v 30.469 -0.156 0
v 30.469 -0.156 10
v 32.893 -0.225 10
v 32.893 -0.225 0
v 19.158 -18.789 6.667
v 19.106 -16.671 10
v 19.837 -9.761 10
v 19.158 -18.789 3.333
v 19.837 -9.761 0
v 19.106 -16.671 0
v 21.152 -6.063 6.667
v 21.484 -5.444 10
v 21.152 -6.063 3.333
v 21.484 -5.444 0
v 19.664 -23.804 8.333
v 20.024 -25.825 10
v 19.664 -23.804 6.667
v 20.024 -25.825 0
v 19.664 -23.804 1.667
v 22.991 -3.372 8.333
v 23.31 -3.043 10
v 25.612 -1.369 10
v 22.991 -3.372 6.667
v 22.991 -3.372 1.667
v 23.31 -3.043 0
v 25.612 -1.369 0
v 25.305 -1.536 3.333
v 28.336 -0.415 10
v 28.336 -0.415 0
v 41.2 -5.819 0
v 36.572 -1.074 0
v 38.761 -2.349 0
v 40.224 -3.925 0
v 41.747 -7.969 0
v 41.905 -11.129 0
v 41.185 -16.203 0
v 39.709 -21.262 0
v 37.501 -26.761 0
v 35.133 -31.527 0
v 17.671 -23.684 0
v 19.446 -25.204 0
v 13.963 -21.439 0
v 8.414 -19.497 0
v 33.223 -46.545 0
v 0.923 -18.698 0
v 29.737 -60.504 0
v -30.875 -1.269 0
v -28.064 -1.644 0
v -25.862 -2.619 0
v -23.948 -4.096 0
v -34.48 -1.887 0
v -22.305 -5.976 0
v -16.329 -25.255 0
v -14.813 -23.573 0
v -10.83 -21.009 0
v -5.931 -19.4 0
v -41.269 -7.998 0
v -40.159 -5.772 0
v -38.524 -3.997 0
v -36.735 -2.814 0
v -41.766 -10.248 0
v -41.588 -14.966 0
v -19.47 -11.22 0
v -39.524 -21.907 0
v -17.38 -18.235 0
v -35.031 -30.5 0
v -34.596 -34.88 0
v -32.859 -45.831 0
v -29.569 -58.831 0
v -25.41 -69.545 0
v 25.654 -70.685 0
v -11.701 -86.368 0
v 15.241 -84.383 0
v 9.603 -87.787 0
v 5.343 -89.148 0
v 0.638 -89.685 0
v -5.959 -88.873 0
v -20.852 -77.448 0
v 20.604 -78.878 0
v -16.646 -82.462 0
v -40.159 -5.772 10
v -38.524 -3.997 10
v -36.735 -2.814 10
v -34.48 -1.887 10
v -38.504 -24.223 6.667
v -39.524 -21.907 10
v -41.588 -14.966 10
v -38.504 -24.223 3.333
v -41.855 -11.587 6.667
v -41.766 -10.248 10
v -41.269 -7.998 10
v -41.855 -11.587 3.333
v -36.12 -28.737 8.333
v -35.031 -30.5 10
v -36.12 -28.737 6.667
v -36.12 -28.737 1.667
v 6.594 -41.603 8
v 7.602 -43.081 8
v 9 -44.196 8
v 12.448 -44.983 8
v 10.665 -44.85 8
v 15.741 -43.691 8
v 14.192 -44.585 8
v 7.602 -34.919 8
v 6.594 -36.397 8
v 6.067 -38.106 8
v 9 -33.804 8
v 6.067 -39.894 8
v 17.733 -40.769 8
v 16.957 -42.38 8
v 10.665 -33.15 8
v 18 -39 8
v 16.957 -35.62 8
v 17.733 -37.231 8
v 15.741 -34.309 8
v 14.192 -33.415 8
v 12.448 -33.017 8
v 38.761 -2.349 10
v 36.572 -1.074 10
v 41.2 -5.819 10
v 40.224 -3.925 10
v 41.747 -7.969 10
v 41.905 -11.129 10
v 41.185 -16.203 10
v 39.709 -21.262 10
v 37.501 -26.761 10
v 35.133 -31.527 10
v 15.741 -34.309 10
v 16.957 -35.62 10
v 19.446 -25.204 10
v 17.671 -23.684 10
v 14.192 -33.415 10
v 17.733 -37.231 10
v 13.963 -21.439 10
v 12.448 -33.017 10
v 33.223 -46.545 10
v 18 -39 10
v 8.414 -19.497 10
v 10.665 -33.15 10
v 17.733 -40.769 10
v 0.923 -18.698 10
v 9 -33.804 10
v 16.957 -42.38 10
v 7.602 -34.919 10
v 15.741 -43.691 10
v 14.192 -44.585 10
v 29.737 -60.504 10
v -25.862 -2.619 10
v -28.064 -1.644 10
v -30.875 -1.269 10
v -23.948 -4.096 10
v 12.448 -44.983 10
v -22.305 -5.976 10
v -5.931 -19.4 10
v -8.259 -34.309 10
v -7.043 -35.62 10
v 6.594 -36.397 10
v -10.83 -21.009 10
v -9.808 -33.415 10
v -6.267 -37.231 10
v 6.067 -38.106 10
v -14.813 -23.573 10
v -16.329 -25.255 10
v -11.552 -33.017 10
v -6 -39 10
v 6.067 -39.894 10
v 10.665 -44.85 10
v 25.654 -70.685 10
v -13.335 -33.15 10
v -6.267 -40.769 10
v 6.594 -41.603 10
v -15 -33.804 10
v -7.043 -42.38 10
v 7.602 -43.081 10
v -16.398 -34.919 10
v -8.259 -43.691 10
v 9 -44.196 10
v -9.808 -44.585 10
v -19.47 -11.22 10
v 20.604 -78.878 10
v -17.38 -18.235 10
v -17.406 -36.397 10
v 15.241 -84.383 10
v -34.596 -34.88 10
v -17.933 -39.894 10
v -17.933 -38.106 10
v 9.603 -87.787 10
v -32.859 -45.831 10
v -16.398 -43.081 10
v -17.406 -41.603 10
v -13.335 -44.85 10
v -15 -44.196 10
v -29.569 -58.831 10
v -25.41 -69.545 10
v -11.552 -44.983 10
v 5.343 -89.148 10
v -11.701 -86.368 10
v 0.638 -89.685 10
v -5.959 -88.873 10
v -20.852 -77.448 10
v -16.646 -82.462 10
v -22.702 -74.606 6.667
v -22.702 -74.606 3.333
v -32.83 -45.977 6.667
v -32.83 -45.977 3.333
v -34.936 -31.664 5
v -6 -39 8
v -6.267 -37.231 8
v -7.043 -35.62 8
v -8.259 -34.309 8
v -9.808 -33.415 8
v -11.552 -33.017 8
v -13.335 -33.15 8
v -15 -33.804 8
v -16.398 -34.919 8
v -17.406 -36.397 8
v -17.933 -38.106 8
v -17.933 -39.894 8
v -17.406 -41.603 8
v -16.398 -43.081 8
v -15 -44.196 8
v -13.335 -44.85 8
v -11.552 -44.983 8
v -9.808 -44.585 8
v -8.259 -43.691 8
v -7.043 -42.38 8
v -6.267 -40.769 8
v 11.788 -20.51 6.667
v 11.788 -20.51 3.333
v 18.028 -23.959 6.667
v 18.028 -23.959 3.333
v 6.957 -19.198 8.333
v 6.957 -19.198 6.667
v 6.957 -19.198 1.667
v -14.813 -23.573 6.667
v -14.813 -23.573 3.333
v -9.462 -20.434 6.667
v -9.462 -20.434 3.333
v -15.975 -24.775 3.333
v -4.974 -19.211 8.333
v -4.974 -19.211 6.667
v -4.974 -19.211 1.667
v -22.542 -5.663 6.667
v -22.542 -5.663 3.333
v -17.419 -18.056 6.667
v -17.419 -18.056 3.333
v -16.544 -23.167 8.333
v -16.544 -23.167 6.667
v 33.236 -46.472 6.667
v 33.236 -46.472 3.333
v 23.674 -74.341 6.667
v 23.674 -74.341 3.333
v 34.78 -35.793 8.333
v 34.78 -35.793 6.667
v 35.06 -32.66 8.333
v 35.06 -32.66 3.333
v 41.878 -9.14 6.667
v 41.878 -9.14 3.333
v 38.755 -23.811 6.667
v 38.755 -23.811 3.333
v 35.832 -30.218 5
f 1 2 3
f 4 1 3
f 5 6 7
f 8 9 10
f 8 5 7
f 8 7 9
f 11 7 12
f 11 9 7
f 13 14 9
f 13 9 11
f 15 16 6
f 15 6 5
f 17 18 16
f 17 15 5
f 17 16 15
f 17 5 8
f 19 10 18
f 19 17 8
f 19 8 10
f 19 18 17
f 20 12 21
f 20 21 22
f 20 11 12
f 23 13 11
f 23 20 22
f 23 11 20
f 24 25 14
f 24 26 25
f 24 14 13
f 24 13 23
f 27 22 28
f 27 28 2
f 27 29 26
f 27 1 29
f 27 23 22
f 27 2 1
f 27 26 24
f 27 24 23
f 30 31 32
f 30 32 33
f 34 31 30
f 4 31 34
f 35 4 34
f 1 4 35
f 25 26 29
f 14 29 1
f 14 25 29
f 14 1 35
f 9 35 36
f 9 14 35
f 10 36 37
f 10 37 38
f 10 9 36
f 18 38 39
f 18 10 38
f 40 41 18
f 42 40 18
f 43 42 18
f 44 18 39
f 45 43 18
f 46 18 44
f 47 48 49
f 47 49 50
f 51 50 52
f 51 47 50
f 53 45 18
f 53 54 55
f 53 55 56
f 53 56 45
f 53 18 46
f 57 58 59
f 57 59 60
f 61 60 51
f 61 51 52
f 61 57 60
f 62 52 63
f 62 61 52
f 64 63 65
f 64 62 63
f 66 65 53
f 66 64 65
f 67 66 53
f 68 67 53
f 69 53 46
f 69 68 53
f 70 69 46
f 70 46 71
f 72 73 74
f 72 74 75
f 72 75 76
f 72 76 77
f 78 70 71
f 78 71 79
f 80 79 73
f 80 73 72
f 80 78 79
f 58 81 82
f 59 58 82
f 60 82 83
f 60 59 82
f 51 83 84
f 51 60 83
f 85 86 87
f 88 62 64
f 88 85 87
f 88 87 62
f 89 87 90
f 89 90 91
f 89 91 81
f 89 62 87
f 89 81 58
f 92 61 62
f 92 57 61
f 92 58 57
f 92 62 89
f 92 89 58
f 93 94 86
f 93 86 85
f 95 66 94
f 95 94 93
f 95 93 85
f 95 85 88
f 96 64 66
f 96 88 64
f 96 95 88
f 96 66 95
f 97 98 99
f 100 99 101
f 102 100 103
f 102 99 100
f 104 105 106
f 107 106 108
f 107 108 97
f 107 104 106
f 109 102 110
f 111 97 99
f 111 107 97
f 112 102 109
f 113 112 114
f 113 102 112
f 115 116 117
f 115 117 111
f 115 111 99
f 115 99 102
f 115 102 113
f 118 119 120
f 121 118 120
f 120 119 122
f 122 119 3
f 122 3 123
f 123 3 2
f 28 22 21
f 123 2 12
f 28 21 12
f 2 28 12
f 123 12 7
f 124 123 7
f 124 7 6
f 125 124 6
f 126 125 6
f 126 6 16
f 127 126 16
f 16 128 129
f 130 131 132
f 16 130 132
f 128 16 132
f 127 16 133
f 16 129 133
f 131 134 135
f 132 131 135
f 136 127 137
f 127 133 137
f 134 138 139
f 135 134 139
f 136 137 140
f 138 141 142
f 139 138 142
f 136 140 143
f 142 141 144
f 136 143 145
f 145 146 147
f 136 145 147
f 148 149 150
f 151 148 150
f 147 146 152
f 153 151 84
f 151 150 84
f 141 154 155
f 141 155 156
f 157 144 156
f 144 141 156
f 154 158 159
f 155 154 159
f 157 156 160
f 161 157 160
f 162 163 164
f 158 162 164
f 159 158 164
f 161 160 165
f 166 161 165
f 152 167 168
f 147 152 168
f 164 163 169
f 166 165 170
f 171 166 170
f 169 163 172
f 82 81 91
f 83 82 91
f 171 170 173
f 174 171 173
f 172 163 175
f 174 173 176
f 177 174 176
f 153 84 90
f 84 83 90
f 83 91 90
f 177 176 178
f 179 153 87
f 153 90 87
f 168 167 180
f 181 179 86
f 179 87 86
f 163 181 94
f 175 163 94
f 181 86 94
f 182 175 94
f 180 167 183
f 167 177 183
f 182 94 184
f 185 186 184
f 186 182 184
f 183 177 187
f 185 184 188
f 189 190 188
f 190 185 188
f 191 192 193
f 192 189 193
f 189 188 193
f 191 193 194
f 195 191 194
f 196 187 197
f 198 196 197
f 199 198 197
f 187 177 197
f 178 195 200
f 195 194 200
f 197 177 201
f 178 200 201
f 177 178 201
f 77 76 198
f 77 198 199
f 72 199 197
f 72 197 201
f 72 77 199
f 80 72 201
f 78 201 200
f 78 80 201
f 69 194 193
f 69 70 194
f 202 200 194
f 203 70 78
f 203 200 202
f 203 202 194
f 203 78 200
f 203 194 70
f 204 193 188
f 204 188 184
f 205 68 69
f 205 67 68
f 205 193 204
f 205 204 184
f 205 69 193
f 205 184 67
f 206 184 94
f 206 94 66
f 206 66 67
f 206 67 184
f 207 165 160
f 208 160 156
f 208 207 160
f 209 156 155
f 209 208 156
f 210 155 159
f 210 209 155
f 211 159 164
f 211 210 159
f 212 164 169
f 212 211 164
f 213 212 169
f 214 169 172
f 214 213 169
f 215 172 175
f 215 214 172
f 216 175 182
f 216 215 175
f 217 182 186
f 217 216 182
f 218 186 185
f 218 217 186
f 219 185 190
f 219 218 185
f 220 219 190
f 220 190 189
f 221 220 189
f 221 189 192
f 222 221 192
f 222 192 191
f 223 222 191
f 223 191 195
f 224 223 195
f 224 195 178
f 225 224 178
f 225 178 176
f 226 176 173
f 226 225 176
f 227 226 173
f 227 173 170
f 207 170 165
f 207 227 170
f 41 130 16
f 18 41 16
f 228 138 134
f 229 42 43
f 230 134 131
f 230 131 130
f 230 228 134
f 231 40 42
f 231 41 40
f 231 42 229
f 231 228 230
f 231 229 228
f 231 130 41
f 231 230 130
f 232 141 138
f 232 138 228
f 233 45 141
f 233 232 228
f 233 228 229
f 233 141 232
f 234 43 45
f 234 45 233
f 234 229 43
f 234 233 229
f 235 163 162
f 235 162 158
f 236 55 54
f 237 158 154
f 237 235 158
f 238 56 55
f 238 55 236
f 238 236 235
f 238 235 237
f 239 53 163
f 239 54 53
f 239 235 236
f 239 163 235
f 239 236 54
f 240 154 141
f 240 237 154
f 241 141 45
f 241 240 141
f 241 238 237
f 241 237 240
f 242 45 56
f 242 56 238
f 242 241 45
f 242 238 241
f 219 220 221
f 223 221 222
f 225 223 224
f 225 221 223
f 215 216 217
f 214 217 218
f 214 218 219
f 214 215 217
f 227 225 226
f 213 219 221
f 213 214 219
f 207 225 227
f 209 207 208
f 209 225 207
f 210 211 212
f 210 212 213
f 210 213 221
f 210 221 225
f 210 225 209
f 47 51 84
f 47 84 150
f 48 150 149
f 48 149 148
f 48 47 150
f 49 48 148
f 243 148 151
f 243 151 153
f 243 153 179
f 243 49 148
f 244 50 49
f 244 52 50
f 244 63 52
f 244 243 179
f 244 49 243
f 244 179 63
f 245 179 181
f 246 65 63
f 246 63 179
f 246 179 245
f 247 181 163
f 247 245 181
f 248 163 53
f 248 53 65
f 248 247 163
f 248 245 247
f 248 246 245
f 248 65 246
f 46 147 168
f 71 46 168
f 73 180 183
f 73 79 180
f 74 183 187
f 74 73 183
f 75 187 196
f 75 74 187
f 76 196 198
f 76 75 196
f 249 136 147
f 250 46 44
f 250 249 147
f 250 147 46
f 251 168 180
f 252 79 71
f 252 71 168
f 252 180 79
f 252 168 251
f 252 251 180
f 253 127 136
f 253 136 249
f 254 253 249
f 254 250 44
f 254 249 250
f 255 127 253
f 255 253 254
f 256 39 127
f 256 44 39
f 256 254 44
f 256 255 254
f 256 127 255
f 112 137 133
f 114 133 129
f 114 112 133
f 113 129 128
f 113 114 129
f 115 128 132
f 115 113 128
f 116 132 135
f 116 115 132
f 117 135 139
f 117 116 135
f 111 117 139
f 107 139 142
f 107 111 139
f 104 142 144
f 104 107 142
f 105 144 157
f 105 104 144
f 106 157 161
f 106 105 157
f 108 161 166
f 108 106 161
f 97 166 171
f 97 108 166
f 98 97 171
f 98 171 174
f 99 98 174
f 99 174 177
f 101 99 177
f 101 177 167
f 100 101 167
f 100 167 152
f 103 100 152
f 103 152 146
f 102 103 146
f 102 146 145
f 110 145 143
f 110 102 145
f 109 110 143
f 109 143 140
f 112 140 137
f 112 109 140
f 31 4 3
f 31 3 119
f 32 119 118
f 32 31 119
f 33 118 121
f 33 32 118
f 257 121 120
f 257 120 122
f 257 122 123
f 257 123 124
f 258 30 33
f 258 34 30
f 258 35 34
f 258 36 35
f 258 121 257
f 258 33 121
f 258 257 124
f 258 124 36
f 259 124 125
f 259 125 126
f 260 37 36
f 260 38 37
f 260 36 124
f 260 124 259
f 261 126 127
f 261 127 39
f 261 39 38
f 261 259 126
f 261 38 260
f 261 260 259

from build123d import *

# Parameters (mm, degrees)
CYLINDER001_R     = 6
CYLINDER001_DEPTH = 10
CYLINDER_R        = 6
CYLINDER_DEPTH    = 10
EXTRUDE_DEPTH     = 10


with BuildPart() as cilindro001:
    # Cylinder001 → Cylinder001 (new body)
    with BuildSketch(Plane(origin=(54, -39, 8), x_dir=(1, 0, 0), z_dir=(0, 0, 1))):
        Circle(CYLINDER001_R)
    extrude(amount=CYLINDER001_DEPTH)


with BuildPart() as fusion:
    # Cylinder → Cylinder (new body)
    with BuildSketch(Plane(origin=(30, -39, 8), x_dir=(1, 0, 0), z_dir=(0, 0, 1))):
        Circle(CYLINDER_R)
    extrude(amount=CYLINDER_DEPTH)

    # Fusion: union Cilindro001
    add(cilindro001.part)


with BuildPart() as cut:
    # path4136 → Extrude (new body)
    with BuildSketch(Plane(origin=(42.376579, -44.354878, 0), x_dir=(0, -1, 0), z_dir=(0, 0, -1))):
        with BuildLine():
            add(Edge.make_bspline(
                [(-13.85455, 35.407203), (-13.85455, 35.407203), (-37.333463, 51.129846), (-42.46778, 34.856929)],
                knots=[0, 0, 0, 0, 1, 1, 1, 1], degree=3))
            add(Edge.make_bspline(
                [(-42.46778, 34.856929), (-47.602099, 18.584013), (-19.100017, 16.70568), (-19.100017, 16.70568)],
                knots=[0, 0, 0, 0, 1, 1, 1, 1], degree=3))
            add(Edge.make_bspline(
                [(-19.100017, 16.70568), (-19.100017, 16.70568), (-25.576689, 12.757134), (-25.65703, -0.546311)],
                knots=[0, 0, 0, 0, 1, 1, 1, 1], degree=3))
            add(Edge.make_bspline(
                [(-25.65703, -0.546311), (-25.73737, -13.849756), (-18.52984, -19.647173), (-18.52984, -19.647173)],
                knots=[0, 0, 0, 0, 1, 1, 1, 1], degree=3))
            add(Edge.make_bspline(
                [(-18.52984, -19.647173), (-18.52984, -19.647173), (-45.927429, -13.606641), (-44.129391, -32.51663)],
                knots=[0, 0, 0, 0, 1, 1, 1, 1], degree=3))
            add(Edge.make_bspline(
                [(-44.129391, -32.51663), (-42.331353, -51.426623), (-12.828091, -34.756809), (-12.828091, -34.756809)],
                knots=[0, 0, 0, 0, 1, 1, 1, 1], degree=3))
            add(Edge.make_bspline(
                [(-12.828091, -34.756809), (-12.828091, -34.756809), (44.732088, -31.969997), (45.329759, -0.261224)],
                knots=[0, 0, 0, 0, 1, 1, 1, 1], degree=3))
            add(Edge.make_bspline(
                [(45.329759, -0.261224), (45.927429, 31.447549), (-13.85455, 35.407203), (-13.85455, 35.407203)],
                knots=[0, 0, 0, 0, 1, 1, 1, 1], degree=3))
        make_face()
    extrude(amount=-EXTRUDE_DEPTH)

    # Cut: cut Fusion
    add(fusion.part, mode=Mode.SUBTRACT)


with BuildPart() as cut_1:
    # Cut placement: moved
    add(cut.part.moved(Location((-42, 0, 0))))


solid = cut_1.part
